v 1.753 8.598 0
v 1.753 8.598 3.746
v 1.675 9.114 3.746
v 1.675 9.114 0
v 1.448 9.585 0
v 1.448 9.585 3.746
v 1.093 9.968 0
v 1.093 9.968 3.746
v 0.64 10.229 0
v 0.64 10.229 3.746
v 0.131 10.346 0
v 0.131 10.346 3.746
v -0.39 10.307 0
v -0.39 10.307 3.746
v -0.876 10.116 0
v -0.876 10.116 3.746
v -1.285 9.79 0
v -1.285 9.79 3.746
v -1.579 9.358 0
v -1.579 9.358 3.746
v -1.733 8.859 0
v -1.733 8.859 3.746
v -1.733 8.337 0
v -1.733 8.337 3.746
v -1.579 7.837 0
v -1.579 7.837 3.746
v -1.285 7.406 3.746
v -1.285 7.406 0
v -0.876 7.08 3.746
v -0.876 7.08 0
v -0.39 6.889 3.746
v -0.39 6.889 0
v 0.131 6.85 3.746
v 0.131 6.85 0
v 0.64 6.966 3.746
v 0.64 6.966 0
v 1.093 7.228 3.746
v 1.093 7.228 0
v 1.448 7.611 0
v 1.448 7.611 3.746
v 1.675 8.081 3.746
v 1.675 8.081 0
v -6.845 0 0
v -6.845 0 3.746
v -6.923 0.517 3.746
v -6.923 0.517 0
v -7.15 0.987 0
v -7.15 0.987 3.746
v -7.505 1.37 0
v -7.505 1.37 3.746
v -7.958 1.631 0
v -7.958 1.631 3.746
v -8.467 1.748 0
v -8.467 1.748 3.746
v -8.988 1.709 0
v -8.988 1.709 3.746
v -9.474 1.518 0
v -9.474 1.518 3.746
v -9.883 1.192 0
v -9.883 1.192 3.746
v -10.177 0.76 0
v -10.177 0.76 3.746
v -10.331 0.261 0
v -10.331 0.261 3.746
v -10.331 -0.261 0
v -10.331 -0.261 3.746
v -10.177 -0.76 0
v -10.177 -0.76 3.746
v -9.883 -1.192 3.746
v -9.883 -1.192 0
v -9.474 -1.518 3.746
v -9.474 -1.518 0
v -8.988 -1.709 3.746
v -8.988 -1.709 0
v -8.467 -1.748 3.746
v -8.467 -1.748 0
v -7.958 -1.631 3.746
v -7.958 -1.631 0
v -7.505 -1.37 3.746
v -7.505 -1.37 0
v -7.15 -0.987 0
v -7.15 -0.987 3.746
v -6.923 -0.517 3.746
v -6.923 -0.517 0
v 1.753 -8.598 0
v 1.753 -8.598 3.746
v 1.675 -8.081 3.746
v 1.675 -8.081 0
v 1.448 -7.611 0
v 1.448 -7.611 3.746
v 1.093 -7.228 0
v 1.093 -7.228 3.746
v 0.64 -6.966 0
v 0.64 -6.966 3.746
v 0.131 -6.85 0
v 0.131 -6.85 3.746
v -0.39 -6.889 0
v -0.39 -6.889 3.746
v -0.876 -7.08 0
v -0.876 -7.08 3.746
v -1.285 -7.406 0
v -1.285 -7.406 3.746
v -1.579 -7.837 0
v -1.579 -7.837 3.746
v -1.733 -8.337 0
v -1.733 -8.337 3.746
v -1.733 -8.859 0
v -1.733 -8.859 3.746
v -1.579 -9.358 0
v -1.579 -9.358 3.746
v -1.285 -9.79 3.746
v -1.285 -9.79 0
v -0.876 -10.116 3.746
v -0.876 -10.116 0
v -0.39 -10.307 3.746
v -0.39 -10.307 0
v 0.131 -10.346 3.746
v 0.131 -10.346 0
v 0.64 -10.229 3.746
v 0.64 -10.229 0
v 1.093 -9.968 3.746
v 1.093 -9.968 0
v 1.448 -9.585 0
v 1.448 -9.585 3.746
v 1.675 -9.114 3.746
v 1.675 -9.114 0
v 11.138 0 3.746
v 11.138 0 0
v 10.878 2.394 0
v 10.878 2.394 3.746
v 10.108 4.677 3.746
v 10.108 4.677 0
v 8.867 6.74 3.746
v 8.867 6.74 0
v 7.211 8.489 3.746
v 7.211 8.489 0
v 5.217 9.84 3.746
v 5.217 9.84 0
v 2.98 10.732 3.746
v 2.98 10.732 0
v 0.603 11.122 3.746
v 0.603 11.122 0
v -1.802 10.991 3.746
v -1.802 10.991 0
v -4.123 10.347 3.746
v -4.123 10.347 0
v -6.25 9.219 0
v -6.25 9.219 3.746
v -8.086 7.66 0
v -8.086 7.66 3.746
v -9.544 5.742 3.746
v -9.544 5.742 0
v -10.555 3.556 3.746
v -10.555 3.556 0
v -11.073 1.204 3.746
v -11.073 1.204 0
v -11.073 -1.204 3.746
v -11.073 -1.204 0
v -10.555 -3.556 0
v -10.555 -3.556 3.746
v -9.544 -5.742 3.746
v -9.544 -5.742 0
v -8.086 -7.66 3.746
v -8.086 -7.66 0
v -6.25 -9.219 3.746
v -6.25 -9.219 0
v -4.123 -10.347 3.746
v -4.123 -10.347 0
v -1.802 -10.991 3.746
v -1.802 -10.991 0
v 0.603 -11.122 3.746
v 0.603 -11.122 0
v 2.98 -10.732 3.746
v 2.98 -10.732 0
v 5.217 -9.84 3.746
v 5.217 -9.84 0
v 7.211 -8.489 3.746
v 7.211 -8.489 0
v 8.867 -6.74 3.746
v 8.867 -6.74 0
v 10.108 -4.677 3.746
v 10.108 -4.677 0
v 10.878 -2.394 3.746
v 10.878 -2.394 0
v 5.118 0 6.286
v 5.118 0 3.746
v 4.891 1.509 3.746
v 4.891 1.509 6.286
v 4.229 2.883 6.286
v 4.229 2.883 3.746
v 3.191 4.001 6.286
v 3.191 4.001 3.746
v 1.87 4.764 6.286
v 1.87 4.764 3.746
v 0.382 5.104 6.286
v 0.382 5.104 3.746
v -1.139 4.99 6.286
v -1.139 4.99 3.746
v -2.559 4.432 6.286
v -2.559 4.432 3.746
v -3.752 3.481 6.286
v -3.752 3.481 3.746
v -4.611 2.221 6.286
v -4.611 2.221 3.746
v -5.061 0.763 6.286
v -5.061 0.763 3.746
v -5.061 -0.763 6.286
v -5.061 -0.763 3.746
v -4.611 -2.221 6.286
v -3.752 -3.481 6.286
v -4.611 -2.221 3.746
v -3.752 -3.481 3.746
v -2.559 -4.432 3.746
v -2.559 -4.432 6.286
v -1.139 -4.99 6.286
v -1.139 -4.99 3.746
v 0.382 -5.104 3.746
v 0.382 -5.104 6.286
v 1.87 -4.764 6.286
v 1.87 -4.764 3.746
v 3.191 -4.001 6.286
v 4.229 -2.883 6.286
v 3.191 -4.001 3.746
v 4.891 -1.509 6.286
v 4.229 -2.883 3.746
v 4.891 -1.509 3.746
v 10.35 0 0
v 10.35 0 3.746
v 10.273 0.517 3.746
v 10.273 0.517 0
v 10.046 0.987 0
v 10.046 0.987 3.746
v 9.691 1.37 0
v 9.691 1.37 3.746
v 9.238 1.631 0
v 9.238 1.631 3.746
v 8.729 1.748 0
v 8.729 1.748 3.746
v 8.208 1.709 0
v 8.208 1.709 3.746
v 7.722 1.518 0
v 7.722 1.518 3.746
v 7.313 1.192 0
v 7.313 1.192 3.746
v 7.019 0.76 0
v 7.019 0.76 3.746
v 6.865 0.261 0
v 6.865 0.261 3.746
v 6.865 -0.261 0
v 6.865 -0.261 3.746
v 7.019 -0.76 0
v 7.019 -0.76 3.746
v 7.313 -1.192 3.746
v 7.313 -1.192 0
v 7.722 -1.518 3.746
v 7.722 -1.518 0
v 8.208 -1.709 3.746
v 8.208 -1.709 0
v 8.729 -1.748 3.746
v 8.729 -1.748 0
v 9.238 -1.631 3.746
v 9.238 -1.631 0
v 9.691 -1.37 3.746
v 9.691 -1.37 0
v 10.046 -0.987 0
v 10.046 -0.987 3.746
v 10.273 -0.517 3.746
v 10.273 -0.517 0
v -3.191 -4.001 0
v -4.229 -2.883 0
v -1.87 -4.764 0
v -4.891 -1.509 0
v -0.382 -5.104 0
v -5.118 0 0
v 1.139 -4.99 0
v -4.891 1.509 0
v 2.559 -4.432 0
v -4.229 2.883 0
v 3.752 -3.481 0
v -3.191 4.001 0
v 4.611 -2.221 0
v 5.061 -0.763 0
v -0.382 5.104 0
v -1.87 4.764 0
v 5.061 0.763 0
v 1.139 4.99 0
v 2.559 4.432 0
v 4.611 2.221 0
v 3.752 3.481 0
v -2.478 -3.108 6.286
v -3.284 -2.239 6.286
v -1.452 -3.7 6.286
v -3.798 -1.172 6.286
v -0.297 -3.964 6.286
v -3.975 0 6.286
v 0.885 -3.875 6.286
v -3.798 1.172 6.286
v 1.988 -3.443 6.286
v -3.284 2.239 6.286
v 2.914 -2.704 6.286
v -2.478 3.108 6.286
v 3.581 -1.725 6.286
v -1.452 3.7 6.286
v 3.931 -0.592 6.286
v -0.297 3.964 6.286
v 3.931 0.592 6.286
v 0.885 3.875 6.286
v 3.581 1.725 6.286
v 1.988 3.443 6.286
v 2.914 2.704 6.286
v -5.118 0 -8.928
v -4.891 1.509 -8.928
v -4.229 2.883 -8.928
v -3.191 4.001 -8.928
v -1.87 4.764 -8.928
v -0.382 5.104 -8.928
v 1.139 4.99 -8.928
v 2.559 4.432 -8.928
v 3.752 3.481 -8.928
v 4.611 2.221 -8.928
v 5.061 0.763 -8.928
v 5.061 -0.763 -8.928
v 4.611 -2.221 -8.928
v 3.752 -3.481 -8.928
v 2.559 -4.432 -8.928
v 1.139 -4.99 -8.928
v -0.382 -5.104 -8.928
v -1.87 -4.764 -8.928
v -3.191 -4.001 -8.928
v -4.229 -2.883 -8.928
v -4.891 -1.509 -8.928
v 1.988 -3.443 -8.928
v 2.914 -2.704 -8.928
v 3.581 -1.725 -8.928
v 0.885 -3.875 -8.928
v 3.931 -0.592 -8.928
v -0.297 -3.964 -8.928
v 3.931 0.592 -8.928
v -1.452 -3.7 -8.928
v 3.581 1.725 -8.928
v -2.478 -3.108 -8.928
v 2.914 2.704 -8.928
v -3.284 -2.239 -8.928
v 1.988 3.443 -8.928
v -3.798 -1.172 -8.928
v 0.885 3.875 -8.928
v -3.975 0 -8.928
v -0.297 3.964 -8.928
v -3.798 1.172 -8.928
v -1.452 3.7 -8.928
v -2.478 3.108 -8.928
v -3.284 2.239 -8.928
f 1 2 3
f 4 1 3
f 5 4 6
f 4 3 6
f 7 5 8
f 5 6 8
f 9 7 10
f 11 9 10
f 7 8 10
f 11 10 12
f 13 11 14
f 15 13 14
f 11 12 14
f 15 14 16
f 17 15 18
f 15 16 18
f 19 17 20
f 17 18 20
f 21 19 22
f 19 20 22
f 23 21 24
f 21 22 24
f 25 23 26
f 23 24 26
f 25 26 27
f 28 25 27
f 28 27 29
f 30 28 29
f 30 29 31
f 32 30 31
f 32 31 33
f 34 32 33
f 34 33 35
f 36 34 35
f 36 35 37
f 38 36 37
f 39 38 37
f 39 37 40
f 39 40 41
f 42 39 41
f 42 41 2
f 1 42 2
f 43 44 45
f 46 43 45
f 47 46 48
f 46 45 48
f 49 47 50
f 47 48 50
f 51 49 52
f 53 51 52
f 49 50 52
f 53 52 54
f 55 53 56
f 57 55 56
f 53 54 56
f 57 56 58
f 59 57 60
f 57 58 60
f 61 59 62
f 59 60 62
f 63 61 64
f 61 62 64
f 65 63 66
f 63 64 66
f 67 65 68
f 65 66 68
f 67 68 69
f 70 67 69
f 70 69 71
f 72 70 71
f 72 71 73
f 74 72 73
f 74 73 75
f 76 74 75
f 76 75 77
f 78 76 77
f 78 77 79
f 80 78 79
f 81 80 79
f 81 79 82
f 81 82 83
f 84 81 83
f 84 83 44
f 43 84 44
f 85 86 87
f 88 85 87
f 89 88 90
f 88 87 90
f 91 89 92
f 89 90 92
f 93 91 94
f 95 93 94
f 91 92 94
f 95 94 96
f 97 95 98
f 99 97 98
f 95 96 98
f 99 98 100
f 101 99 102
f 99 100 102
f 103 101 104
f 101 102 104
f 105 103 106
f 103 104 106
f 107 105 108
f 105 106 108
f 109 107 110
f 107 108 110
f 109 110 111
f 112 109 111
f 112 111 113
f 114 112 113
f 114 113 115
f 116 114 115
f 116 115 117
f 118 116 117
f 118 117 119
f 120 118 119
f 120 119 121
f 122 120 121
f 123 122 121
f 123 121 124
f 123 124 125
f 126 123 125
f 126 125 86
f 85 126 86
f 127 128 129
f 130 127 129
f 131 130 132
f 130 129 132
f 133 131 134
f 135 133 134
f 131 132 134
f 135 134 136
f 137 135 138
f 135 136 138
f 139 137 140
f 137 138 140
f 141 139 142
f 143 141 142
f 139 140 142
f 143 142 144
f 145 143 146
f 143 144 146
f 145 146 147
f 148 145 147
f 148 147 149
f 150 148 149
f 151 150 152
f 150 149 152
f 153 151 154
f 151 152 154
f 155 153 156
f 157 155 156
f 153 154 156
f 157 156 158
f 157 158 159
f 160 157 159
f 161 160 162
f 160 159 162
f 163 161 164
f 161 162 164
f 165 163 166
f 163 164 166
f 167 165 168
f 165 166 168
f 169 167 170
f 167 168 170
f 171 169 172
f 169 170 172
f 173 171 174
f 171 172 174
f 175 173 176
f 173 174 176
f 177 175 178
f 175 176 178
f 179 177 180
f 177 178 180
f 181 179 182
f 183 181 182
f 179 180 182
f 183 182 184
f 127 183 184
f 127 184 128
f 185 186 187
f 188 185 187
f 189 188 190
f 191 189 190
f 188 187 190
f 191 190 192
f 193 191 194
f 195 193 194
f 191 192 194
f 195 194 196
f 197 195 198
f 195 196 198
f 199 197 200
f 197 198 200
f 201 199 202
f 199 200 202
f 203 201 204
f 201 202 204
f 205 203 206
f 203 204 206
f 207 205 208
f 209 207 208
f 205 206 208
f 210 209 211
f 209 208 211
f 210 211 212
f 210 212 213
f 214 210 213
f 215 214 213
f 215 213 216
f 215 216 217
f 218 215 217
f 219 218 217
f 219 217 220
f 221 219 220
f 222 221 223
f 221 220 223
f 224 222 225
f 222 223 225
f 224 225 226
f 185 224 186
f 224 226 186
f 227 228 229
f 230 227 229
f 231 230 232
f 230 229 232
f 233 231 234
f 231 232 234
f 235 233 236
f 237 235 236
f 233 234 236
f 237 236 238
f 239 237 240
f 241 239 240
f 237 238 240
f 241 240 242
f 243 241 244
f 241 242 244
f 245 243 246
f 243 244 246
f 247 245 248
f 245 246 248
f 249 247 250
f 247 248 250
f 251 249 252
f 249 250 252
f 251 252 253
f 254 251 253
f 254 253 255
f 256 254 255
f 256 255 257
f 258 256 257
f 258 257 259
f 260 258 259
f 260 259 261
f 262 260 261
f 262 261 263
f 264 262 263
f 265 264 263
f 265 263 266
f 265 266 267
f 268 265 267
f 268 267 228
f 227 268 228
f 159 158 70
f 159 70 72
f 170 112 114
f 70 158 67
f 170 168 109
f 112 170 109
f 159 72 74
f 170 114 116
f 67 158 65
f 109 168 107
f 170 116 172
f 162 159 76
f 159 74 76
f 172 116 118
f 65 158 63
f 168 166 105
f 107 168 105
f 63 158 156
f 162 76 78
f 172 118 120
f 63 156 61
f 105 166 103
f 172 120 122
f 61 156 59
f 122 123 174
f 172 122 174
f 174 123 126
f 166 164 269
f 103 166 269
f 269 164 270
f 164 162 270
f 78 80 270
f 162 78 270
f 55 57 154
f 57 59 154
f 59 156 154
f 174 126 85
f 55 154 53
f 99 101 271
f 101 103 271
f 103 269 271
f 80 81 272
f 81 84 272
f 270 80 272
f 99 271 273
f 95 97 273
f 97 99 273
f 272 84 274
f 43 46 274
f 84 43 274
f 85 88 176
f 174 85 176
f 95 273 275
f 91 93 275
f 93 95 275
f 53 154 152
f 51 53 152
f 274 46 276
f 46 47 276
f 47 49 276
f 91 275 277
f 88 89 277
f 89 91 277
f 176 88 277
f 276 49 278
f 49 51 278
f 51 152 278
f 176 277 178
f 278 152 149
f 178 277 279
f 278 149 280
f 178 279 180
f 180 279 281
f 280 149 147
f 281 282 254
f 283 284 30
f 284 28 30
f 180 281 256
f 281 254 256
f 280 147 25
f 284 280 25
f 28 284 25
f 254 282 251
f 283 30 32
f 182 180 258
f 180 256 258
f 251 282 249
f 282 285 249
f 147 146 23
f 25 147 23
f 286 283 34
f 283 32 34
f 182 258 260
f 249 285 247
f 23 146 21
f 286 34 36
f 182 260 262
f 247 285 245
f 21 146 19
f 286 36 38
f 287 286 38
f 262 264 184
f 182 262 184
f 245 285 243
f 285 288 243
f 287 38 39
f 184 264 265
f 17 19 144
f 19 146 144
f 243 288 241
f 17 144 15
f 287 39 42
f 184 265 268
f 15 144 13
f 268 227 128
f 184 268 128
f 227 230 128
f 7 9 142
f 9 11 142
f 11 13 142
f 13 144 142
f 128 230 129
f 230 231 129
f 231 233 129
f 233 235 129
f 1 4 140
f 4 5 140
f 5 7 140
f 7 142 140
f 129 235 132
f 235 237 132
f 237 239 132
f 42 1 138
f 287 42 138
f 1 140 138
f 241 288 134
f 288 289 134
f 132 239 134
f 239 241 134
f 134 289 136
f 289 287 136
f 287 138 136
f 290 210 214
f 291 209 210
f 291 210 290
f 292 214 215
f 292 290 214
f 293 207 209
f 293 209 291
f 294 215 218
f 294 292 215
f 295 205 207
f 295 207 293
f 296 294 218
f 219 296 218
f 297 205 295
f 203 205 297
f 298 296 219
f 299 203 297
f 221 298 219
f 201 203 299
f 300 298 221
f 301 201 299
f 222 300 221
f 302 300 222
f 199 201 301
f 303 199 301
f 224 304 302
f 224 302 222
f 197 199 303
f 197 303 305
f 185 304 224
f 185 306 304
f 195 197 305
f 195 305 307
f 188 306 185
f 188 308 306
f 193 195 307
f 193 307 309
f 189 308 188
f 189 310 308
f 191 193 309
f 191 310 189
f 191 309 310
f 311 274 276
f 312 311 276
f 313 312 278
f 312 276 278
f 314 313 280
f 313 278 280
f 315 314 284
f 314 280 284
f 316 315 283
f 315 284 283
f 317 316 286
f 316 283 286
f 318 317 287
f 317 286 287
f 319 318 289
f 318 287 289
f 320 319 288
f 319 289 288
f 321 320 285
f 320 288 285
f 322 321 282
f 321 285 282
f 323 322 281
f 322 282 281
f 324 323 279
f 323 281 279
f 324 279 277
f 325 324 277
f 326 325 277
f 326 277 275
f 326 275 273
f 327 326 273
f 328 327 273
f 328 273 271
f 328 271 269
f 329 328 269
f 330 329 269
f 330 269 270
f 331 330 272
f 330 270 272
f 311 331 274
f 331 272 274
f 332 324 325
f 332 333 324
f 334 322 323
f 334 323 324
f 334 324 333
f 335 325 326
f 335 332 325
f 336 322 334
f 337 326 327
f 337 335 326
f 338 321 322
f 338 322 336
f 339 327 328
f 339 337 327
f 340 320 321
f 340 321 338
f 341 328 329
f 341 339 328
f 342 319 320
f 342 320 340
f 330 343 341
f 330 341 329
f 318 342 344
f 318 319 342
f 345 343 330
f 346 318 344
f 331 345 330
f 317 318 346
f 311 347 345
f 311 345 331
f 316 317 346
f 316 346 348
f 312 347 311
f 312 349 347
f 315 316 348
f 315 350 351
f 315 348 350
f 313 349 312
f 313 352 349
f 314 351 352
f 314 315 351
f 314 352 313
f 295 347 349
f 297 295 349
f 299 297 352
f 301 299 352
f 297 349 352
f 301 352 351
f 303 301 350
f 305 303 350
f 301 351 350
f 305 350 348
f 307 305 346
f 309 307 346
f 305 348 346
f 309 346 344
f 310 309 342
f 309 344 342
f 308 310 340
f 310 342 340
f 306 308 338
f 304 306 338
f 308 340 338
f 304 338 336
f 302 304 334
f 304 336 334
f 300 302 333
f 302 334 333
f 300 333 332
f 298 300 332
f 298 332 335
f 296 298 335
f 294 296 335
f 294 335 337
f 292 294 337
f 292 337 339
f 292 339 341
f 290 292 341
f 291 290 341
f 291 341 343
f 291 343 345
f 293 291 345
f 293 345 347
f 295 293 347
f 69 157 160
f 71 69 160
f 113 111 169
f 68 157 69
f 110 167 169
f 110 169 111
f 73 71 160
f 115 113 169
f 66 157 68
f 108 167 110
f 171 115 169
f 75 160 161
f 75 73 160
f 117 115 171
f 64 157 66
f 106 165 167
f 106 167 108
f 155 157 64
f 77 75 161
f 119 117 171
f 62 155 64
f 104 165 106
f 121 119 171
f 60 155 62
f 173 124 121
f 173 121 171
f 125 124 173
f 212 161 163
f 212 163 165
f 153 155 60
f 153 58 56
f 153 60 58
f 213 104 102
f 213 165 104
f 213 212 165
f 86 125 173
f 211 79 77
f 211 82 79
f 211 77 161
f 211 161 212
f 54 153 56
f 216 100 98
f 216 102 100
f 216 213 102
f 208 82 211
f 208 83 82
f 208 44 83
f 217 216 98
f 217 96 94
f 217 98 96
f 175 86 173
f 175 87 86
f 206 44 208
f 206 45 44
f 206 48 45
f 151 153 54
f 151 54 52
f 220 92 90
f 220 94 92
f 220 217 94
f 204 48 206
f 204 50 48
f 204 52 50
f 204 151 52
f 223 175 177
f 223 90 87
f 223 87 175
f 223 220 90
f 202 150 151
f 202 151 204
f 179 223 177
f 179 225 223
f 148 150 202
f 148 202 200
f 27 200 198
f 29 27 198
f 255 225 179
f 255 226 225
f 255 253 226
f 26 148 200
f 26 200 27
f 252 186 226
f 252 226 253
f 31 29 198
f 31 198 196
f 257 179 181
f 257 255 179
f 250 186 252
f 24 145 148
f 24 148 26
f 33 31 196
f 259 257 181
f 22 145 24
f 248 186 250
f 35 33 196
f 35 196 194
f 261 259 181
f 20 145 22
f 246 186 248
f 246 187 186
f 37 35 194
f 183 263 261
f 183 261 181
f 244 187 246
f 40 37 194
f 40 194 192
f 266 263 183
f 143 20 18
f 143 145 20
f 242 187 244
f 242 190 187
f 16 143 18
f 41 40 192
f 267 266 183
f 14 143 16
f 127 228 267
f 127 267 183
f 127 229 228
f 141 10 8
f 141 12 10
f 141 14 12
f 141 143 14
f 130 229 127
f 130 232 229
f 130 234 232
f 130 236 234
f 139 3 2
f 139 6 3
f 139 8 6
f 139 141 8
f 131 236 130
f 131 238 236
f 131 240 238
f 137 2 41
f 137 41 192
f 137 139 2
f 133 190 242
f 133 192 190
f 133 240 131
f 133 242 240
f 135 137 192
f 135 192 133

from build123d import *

# Parameters (mm, degrees)
SKETCH1_R           = 11.1379
BOSS_EXTRUDE1_DEPTH = 3.7465
SKETCH2_R           = 5.1181
BOSS_EXTRUDE2_DEPTH = 8.9281
SKETCH3_R           = 5.1181
BOSS_EXTRUDE3_DEPTH = 2.54
SKETCH4_R           = 3.9751
CUT_EXTRUDE1_DEPTH  = 16.2146
SKETCH5_R           = 1.7526
CUT_EXTRUDE2_DEPTH  = 13.6746


with BuildPart() as part:
    # Sketch1 → Boss-Extrude1 (new body)
    with BuildSketch(Plane.XY):
        Circle(SKETCH1_R)
    extrude(amount=BOSS_EXTRUDE1_DEPTH)

    # Sketch2 → Boss-Extrude2 (add)
    with BuildSketch(Plane(origin=(0, 0, 0), x_dir=(-1, 0, 0), z_dir=(0, 0, -1))):
        Circle(SKETCH2_R)
    extrude(amount=BOSS_EXTRUDE2_DEPTH)

    # Sketch3 → Boss-Extrude3 (add)
    with BuildSketch(Plane.XY.offset(3.7465)):
        Circle(SKETCH3_R)
    extrude(amount=BOSS_EXTRUDE3_DEPTH)

    # Sketch4 → Cut-Extrude1 (cut, through all)
    with BuildSketch(Plane(origin=(0, 0, -8.9281), x_dir=(-1, 0, 0), z_dir=(0, 0, -1))):
        Circle(SKETCH4_R)
    extrude(amount=-CUT_EXTRUDE1_DEPTH, mode=Mode.SUBTRACT)

    # Sketch5 → Cut-Extrude2 (cut, through all)
    with BuildSketch(Plane.XY.offset(3.7465)):
        with Locations((0, 8.5979)):
            Circle(SKETCH5_R)
        with Locations((8.5979, 0)):
            Circle(SKETCH5_R)
        with Locations((0, -8.5979)):
            Circle(SKETCH5_R)
        with Locations((-8.5979, 0)):
            Circle(SKETCH5_R)
    extrude(amount=-CUT_EXTRUDE2_DEPTH, mode=Mode.SUBTRACT)


solid = part.part
